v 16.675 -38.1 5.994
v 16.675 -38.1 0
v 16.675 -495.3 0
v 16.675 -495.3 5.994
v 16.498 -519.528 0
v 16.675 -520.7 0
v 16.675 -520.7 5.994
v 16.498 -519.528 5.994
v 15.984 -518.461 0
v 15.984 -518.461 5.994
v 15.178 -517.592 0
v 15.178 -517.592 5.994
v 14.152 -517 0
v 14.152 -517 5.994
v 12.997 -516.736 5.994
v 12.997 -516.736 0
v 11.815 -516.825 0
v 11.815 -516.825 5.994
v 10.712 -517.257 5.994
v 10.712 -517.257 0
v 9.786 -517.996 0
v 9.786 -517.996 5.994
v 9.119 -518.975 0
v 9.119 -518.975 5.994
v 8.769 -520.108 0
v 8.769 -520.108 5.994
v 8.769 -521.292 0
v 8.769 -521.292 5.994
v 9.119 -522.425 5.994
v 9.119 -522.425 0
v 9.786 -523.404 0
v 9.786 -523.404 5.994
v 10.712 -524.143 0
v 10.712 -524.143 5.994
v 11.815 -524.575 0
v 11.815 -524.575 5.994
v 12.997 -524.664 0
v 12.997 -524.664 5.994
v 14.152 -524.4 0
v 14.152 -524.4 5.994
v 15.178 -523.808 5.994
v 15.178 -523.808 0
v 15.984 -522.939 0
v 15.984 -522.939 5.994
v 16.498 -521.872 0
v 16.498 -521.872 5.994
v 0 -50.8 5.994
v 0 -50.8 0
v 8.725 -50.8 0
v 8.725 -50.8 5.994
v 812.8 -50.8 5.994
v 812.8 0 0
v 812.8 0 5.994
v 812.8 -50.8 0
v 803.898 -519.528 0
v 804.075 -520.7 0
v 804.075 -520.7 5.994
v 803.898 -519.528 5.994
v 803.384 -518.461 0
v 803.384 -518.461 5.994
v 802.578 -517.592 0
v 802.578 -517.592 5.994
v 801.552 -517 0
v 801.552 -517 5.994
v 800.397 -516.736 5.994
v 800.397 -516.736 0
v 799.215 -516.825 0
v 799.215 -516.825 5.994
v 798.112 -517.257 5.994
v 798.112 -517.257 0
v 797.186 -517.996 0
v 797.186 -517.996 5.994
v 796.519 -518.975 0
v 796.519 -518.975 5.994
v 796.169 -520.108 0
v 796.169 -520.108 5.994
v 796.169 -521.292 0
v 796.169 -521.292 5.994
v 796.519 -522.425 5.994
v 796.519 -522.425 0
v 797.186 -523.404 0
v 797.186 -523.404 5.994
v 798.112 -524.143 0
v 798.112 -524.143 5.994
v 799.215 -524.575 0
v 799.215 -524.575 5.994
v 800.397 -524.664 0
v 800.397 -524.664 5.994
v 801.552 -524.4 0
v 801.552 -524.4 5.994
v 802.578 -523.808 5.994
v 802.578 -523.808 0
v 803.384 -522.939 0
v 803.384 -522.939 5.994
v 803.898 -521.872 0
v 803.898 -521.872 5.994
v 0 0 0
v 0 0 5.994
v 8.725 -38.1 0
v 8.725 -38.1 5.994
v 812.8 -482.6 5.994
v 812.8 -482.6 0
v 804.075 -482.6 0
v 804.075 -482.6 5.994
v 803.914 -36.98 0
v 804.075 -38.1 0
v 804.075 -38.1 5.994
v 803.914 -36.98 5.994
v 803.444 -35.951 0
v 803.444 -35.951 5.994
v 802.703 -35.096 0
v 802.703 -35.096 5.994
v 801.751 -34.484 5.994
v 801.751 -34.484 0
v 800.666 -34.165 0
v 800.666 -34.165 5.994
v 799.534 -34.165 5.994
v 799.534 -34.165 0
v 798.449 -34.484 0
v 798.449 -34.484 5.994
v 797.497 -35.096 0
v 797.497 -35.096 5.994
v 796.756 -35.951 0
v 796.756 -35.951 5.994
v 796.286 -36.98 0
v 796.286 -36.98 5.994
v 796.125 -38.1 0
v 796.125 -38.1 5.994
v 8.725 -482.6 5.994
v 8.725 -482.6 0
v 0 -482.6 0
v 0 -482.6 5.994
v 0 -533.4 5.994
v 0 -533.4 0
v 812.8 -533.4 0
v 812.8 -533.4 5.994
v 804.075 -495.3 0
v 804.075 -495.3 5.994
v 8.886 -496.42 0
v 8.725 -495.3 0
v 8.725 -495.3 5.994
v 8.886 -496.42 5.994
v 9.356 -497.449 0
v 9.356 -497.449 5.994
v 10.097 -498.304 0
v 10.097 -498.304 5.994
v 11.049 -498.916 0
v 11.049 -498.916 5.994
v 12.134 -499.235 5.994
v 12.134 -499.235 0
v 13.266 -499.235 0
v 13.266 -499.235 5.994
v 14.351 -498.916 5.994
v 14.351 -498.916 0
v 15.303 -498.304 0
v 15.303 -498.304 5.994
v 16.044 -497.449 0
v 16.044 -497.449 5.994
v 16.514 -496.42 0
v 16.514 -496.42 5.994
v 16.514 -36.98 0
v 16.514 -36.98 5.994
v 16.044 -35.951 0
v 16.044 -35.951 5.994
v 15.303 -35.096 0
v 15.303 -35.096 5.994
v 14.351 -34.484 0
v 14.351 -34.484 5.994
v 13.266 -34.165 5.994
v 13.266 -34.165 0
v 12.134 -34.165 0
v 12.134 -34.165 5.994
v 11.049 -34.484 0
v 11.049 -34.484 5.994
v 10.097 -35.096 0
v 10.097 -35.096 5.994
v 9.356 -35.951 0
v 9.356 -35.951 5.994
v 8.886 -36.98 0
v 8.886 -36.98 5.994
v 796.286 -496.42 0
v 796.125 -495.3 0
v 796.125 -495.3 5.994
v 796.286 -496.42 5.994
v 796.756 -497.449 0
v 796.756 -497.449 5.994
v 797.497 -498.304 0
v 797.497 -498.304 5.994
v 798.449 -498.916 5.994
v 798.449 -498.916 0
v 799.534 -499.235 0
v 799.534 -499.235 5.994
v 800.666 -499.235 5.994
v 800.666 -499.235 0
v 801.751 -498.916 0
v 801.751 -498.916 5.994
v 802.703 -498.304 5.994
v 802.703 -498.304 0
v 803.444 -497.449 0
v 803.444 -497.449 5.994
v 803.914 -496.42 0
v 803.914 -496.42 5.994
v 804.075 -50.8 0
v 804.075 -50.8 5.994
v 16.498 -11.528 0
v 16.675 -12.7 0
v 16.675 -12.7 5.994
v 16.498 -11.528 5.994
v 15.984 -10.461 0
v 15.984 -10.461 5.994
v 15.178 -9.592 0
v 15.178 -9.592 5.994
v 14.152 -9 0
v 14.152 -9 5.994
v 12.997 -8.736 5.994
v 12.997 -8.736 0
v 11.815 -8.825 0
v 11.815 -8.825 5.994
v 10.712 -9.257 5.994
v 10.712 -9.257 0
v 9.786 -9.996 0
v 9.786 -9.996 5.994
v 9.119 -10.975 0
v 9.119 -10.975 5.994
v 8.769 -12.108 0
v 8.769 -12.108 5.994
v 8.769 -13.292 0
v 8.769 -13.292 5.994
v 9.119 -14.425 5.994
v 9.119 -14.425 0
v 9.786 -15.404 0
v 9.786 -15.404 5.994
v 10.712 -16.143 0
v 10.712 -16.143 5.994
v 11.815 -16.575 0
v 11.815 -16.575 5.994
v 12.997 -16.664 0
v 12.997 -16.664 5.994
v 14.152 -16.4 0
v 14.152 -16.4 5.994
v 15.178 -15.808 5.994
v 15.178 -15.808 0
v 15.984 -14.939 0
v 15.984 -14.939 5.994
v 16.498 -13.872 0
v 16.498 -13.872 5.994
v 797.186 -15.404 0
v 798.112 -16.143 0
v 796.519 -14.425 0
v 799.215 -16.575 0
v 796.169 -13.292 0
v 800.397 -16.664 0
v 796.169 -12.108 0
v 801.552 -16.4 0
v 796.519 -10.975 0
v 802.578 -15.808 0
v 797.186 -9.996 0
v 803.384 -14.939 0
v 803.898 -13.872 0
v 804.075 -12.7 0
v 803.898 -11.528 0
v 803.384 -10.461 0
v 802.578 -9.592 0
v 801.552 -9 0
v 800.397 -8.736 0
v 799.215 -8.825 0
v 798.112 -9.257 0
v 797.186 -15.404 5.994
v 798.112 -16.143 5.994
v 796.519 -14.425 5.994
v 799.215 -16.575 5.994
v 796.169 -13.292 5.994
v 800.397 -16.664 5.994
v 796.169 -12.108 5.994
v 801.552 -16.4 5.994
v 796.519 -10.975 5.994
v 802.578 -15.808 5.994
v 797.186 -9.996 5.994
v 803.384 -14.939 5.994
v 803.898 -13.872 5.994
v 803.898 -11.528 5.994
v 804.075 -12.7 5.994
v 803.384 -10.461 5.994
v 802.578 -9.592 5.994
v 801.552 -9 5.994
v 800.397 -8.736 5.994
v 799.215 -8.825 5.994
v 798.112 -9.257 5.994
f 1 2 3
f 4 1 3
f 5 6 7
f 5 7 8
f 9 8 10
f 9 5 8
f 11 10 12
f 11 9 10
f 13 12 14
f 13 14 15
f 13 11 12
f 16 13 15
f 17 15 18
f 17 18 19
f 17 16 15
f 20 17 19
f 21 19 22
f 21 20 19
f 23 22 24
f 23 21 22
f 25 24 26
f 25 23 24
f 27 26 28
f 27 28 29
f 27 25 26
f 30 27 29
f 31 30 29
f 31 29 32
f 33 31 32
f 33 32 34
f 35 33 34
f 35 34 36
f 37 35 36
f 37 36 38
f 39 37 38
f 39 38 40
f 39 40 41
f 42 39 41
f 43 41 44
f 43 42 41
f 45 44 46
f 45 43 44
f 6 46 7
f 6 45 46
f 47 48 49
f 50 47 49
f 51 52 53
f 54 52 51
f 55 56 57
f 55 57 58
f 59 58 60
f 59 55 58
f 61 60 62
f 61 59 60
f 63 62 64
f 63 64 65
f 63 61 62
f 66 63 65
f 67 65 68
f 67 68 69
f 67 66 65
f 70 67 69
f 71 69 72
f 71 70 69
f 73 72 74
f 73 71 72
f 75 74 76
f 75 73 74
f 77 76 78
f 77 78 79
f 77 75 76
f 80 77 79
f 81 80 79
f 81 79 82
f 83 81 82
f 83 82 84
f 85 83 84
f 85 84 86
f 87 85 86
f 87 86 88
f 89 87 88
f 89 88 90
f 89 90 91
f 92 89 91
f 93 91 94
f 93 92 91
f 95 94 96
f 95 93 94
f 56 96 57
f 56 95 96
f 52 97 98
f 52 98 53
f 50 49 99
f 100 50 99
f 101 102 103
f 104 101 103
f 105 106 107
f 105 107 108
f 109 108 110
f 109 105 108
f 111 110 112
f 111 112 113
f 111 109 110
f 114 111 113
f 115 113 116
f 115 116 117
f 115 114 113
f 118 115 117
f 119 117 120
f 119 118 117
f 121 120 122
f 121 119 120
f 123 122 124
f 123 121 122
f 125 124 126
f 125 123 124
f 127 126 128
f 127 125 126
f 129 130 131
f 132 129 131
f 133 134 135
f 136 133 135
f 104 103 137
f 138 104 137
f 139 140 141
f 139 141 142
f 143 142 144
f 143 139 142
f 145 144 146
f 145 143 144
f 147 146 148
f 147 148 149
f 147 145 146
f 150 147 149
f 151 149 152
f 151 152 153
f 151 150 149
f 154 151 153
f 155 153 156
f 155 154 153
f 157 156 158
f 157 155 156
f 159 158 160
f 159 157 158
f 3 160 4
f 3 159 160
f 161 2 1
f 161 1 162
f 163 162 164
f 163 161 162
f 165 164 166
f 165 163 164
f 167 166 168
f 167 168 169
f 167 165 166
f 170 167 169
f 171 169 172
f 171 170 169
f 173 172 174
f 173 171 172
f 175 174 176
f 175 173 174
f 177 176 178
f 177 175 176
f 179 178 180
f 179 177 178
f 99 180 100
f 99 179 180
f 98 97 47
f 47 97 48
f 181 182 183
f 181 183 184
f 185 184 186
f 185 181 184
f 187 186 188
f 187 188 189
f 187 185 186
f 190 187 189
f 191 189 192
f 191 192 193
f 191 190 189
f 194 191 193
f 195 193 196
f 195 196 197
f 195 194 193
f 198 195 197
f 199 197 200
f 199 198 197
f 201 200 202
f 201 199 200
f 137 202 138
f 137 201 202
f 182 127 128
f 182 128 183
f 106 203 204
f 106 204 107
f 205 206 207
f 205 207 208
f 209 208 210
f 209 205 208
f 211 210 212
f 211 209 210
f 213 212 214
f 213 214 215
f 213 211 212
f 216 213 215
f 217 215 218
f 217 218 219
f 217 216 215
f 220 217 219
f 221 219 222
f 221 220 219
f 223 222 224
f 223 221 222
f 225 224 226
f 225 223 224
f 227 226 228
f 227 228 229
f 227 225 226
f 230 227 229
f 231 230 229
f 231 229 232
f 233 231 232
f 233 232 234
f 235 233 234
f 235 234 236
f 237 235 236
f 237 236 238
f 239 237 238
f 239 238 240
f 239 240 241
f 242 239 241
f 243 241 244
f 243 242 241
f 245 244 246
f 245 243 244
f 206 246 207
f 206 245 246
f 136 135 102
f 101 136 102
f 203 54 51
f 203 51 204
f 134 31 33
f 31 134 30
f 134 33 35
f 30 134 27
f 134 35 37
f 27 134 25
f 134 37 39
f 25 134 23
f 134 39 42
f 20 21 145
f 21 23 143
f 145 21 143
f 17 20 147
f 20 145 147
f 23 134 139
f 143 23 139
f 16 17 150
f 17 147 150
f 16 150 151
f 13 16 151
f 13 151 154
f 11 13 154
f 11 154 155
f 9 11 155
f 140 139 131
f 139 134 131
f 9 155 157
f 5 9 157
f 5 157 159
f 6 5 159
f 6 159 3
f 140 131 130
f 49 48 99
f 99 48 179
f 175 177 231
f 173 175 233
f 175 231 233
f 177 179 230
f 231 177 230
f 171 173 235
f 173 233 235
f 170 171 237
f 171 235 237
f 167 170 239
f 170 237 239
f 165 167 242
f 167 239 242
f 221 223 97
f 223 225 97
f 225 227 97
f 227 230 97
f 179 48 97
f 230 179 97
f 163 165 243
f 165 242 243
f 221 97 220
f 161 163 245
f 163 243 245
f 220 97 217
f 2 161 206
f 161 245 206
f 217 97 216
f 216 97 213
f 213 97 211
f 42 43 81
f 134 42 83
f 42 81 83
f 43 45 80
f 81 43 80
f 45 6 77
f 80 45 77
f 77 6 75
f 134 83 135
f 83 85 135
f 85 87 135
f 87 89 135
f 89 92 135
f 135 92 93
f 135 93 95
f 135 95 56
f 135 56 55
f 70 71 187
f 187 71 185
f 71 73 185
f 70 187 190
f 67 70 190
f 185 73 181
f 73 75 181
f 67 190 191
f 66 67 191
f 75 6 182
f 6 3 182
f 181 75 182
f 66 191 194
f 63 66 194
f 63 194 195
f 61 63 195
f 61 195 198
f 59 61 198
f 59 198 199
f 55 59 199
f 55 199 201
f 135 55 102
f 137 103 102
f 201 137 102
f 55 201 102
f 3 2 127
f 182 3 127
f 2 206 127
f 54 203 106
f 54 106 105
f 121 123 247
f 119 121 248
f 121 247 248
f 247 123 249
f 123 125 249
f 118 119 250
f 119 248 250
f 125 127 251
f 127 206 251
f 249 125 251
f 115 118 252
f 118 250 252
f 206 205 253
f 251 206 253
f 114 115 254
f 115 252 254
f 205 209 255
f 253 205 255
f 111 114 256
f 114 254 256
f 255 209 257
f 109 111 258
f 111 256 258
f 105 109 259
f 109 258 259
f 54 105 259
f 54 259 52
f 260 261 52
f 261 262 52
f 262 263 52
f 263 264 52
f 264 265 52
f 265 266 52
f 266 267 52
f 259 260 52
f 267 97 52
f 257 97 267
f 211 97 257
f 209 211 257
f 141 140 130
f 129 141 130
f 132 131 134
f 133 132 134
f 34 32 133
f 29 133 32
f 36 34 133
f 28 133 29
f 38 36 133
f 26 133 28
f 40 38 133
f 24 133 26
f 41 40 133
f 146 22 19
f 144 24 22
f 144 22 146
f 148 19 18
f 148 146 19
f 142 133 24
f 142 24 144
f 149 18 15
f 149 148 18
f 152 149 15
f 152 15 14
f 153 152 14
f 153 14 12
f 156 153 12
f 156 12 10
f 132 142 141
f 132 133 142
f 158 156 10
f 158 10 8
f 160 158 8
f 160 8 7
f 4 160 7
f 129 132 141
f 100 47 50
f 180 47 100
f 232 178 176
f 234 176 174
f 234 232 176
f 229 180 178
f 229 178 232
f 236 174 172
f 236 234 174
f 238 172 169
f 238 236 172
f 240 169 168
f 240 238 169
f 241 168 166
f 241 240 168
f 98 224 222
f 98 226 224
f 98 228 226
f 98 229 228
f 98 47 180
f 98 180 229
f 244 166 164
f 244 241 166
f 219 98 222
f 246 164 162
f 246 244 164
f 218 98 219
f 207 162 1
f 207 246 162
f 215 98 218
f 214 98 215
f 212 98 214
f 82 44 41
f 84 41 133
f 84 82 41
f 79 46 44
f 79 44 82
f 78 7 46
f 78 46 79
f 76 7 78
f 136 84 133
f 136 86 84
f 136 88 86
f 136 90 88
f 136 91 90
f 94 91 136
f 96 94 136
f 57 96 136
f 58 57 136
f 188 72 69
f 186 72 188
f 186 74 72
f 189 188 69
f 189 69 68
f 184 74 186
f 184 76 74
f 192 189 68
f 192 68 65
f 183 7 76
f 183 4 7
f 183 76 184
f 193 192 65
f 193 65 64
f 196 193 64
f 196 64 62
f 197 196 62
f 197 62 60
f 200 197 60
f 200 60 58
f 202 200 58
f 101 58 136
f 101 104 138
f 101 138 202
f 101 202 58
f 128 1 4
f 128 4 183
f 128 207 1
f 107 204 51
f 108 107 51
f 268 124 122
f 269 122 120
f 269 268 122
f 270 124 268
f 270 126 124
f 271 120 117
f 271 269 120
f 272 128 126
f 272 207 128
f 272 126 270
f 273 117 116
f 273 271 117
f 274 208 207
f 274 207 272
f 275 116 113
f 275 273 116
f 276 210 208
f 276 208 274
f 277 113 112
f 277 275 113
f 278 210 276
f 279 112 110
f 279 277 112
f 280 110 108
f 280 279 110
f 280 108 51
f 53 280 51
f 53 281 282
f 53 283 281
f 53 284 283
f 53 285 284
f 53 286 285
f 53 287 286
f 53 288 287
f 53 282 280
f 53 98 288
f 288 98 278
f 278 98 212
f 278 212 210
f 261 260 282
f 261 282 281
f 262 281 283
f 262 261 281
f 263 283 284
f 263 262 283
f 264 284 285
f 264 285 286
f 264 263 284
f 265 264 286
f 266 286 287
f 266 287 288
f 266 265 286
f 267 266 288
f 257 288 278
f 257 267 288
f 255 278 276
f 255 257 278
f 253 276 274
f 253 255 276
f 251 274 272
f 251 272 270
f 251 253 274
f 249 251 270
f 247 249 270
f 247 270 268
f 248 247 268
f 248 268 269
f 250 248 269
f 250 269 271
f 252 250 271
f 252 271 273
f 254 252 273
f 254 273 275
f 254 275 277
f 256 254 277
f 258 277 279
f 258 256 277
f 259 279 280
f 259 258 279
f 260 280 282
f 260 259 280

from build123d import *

# Parameters (mm, degrees)
SKETCH_R      = 3.9751
EXTRUDE_DEPTH = 5.9944


with BuildPart() as part:
    # Sketch → Extrude (new body)
    with BuildSketch(Plane.XY):
        with BuildLine():
            Line((0, 0), (0, -50.8))
            Line((0, -50.8), (8.7249, -50.8))
            Line((8.7249, -50.8), (8.7249, -38.1))
            ThreePointArc((16.6751, -38.1), (12.7, -34.1249), (8.7249, -38.1))
            Line((16.6751, -38.1), (16.6751, -495.3))
            ThreePointArc((8.7249, -495.3), (12.7, -499.2751), (16.6751, -495.3))
            Line((8.7249, -495.3), (8.7249, -482.6))
            Line((8.7249, -482.6), (0, -482.6))
            Line((0, -482.6), (0, -533.4))
            Line((0, -533.4), (812.8, -533.4))
            Line((812.8, -533.4), (812.8, -482.6))
            Line((812.8, -482.6), (804.0751, -482.6))
            Line((804.0751, -482.6), (804.0751, -495.3))
            ThreePointArc((796.1249, -495.3), (800.1, -499.2751), (804.0751, -495.3))
            Line((796.1249, -38.1), (796.1249, -495.3))
            ThreePointArc((804.0751, -38.1), (800.1, -34.1249), (796.1249, -38.1))
            Line((804.0751, -50.8), (804.0751, -38.1))
            Line((812.8, -50.8), (804.0751, -50.8))
            Line((812.8, 0), (812.8, -50.8))
            Line((0, 0), (812.8, 0))
        make_face()
        with Locations((12.7, -12.7)):
            Circle(SKETCH_R, mode=Mode.SUBTRACT)
        with Locations((800.1, -12.7)):
            Circle(SKETCH_R, mode=Mode.SUBTRACT)
        with Locations((12.7, -520.7)):
            Circle(SKETCH_R, mode=Mode.SUBTRACT)
        with Locations((800.1, -520.7)):
            Circle(SKETCH_R, mode=Mode.SUBTRACT)
    extrude(amount=EXTRUDE_DEPTH)


solid = part.part
